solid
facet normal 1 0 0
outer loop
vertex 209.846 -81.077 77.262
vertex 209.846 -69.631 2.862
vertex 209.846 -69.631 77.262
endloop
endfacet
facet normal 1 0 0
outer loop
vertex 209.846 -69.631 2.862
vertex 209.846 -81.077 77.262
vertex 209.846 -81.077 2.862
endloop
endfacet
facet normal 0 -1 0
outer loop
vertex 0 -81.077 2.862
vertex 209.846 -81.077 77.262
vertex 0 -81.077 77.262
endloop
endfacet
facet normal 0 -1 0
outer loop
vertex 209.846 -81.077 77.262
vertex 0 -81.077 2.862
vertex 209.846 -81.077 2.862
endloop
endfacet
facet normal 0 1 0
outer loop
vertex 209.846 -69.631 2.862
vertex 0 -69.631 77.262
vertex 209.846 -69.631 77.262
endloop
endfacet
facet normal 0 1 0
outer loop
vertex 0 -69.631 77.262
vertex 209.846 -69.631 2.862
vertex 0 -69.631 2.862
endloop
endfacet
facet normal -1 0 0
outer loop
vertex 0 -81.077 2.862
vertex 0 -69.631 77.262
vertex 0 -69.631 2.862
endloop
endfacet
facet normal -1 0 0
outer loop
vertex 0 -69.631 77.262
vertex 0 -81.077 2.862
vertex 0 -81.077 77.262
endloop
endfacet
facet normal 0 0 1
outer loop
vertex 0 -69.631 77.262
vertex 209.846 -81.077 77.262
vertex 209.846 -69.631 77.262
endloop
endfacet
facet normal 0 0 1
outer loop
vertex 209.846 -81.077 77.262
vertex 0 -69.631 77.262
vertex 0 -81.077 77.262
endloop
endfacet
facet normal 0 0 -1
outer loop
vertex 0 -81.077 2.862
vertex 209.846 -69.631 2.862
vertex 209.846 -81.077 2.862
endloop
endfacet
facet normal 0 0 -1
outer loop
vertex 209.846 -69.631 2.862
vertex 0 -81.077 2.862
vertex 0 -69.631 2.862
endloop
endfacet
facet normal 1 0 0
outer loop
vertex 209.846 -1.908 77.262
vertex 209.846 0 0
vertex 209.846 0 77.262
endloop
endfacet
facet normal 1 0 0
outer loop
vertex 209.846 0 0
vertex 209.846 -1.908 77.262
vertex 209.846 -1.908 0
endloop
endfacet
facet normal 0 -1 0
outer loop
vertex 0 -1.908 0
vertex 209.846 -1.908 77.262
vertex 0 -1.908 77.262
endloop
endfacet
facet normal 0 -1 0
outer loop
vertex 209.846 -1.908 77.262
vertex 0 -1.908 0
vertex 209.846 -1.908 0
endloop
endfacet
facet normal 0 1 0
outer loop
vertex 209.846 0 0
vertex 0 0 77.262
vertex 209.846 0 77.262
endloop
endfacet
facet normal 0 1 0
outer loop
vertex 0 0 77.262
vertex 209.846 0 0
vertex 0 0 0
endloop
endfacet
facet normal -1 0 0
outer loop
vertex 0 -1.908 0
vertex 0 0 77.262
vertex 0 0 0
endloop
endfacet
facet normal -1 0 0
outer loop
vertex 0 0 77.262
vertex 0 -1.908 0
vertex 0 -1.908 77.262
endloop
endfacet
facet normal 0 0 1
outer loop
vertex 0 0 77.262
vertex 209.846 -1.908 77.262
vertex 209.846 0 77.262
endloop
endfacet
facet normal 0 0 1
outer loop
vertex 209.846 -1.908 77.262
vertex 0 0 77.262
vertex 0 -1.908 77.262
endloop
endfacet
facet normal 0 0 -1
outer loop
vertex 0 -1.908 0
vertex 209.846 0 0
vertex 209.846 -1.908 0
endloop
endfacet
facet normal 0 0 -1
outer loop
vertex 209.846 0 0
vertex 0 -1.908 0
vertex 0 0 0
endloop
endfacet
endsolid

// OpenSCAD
// file: defs.scad
LENGTH       = 220;
HEIGHT       = 83;
WIDTH        = 81;
RECESS       = 3; // 5 is too deep
CUP_DIAMETER = 62; // in mm

RATIO = CUP_DIAMETER / 65;
ATOM = 0.01;
// main file
/* WEYLAND-YUTANI CORP ESPRESSO CUPS HOLDER
 *
 * (C) 2017 by Pascal Bauermeister.
 * License: Creative Commons Attribution-NonCommercial-ShareAlike 2.5.
 */

include <defs.scad>

scale(RATIO)
rotate([90, 0, 0])
all();

module main() {
    if(1)
    translate([0, WIDTH, 0])
    rotate([90, 0, 0])
    scale([10, 10, WIDTH/100])
    linear_extrude(h=1)
    import("logo.dxf");

    translate([0, RECESS, HEIGHT-12])
    cube([LENGTH, WIDTH - RECESS, 12]);    
}

module side_cut() {
    translate([0, WIDTH, 0])
    rotate([90, 0, 0])
    scale([10, 10, WIDTH/100])
    linear_extrude(h=1)
    import("side-cut.dxf");
}

module cavity() {
    scale([10, 10, HEIGHT/100+1])
    linear_extrude(h=1)
    import("cavity.dxf");
}

module wall() {
    scale([10, 10, HEIGHT/100])
    linear_extrude(h=1)
    import("wall.dxf");
}

module all() {
    translate([0, 0, 2])
    difference() {
        union() {
            difference() {
                main();
               cavity();
            }
            wall();
        }
        side_cut();
    }

    cube([LENGTH, WIDTH, 2]);
}
